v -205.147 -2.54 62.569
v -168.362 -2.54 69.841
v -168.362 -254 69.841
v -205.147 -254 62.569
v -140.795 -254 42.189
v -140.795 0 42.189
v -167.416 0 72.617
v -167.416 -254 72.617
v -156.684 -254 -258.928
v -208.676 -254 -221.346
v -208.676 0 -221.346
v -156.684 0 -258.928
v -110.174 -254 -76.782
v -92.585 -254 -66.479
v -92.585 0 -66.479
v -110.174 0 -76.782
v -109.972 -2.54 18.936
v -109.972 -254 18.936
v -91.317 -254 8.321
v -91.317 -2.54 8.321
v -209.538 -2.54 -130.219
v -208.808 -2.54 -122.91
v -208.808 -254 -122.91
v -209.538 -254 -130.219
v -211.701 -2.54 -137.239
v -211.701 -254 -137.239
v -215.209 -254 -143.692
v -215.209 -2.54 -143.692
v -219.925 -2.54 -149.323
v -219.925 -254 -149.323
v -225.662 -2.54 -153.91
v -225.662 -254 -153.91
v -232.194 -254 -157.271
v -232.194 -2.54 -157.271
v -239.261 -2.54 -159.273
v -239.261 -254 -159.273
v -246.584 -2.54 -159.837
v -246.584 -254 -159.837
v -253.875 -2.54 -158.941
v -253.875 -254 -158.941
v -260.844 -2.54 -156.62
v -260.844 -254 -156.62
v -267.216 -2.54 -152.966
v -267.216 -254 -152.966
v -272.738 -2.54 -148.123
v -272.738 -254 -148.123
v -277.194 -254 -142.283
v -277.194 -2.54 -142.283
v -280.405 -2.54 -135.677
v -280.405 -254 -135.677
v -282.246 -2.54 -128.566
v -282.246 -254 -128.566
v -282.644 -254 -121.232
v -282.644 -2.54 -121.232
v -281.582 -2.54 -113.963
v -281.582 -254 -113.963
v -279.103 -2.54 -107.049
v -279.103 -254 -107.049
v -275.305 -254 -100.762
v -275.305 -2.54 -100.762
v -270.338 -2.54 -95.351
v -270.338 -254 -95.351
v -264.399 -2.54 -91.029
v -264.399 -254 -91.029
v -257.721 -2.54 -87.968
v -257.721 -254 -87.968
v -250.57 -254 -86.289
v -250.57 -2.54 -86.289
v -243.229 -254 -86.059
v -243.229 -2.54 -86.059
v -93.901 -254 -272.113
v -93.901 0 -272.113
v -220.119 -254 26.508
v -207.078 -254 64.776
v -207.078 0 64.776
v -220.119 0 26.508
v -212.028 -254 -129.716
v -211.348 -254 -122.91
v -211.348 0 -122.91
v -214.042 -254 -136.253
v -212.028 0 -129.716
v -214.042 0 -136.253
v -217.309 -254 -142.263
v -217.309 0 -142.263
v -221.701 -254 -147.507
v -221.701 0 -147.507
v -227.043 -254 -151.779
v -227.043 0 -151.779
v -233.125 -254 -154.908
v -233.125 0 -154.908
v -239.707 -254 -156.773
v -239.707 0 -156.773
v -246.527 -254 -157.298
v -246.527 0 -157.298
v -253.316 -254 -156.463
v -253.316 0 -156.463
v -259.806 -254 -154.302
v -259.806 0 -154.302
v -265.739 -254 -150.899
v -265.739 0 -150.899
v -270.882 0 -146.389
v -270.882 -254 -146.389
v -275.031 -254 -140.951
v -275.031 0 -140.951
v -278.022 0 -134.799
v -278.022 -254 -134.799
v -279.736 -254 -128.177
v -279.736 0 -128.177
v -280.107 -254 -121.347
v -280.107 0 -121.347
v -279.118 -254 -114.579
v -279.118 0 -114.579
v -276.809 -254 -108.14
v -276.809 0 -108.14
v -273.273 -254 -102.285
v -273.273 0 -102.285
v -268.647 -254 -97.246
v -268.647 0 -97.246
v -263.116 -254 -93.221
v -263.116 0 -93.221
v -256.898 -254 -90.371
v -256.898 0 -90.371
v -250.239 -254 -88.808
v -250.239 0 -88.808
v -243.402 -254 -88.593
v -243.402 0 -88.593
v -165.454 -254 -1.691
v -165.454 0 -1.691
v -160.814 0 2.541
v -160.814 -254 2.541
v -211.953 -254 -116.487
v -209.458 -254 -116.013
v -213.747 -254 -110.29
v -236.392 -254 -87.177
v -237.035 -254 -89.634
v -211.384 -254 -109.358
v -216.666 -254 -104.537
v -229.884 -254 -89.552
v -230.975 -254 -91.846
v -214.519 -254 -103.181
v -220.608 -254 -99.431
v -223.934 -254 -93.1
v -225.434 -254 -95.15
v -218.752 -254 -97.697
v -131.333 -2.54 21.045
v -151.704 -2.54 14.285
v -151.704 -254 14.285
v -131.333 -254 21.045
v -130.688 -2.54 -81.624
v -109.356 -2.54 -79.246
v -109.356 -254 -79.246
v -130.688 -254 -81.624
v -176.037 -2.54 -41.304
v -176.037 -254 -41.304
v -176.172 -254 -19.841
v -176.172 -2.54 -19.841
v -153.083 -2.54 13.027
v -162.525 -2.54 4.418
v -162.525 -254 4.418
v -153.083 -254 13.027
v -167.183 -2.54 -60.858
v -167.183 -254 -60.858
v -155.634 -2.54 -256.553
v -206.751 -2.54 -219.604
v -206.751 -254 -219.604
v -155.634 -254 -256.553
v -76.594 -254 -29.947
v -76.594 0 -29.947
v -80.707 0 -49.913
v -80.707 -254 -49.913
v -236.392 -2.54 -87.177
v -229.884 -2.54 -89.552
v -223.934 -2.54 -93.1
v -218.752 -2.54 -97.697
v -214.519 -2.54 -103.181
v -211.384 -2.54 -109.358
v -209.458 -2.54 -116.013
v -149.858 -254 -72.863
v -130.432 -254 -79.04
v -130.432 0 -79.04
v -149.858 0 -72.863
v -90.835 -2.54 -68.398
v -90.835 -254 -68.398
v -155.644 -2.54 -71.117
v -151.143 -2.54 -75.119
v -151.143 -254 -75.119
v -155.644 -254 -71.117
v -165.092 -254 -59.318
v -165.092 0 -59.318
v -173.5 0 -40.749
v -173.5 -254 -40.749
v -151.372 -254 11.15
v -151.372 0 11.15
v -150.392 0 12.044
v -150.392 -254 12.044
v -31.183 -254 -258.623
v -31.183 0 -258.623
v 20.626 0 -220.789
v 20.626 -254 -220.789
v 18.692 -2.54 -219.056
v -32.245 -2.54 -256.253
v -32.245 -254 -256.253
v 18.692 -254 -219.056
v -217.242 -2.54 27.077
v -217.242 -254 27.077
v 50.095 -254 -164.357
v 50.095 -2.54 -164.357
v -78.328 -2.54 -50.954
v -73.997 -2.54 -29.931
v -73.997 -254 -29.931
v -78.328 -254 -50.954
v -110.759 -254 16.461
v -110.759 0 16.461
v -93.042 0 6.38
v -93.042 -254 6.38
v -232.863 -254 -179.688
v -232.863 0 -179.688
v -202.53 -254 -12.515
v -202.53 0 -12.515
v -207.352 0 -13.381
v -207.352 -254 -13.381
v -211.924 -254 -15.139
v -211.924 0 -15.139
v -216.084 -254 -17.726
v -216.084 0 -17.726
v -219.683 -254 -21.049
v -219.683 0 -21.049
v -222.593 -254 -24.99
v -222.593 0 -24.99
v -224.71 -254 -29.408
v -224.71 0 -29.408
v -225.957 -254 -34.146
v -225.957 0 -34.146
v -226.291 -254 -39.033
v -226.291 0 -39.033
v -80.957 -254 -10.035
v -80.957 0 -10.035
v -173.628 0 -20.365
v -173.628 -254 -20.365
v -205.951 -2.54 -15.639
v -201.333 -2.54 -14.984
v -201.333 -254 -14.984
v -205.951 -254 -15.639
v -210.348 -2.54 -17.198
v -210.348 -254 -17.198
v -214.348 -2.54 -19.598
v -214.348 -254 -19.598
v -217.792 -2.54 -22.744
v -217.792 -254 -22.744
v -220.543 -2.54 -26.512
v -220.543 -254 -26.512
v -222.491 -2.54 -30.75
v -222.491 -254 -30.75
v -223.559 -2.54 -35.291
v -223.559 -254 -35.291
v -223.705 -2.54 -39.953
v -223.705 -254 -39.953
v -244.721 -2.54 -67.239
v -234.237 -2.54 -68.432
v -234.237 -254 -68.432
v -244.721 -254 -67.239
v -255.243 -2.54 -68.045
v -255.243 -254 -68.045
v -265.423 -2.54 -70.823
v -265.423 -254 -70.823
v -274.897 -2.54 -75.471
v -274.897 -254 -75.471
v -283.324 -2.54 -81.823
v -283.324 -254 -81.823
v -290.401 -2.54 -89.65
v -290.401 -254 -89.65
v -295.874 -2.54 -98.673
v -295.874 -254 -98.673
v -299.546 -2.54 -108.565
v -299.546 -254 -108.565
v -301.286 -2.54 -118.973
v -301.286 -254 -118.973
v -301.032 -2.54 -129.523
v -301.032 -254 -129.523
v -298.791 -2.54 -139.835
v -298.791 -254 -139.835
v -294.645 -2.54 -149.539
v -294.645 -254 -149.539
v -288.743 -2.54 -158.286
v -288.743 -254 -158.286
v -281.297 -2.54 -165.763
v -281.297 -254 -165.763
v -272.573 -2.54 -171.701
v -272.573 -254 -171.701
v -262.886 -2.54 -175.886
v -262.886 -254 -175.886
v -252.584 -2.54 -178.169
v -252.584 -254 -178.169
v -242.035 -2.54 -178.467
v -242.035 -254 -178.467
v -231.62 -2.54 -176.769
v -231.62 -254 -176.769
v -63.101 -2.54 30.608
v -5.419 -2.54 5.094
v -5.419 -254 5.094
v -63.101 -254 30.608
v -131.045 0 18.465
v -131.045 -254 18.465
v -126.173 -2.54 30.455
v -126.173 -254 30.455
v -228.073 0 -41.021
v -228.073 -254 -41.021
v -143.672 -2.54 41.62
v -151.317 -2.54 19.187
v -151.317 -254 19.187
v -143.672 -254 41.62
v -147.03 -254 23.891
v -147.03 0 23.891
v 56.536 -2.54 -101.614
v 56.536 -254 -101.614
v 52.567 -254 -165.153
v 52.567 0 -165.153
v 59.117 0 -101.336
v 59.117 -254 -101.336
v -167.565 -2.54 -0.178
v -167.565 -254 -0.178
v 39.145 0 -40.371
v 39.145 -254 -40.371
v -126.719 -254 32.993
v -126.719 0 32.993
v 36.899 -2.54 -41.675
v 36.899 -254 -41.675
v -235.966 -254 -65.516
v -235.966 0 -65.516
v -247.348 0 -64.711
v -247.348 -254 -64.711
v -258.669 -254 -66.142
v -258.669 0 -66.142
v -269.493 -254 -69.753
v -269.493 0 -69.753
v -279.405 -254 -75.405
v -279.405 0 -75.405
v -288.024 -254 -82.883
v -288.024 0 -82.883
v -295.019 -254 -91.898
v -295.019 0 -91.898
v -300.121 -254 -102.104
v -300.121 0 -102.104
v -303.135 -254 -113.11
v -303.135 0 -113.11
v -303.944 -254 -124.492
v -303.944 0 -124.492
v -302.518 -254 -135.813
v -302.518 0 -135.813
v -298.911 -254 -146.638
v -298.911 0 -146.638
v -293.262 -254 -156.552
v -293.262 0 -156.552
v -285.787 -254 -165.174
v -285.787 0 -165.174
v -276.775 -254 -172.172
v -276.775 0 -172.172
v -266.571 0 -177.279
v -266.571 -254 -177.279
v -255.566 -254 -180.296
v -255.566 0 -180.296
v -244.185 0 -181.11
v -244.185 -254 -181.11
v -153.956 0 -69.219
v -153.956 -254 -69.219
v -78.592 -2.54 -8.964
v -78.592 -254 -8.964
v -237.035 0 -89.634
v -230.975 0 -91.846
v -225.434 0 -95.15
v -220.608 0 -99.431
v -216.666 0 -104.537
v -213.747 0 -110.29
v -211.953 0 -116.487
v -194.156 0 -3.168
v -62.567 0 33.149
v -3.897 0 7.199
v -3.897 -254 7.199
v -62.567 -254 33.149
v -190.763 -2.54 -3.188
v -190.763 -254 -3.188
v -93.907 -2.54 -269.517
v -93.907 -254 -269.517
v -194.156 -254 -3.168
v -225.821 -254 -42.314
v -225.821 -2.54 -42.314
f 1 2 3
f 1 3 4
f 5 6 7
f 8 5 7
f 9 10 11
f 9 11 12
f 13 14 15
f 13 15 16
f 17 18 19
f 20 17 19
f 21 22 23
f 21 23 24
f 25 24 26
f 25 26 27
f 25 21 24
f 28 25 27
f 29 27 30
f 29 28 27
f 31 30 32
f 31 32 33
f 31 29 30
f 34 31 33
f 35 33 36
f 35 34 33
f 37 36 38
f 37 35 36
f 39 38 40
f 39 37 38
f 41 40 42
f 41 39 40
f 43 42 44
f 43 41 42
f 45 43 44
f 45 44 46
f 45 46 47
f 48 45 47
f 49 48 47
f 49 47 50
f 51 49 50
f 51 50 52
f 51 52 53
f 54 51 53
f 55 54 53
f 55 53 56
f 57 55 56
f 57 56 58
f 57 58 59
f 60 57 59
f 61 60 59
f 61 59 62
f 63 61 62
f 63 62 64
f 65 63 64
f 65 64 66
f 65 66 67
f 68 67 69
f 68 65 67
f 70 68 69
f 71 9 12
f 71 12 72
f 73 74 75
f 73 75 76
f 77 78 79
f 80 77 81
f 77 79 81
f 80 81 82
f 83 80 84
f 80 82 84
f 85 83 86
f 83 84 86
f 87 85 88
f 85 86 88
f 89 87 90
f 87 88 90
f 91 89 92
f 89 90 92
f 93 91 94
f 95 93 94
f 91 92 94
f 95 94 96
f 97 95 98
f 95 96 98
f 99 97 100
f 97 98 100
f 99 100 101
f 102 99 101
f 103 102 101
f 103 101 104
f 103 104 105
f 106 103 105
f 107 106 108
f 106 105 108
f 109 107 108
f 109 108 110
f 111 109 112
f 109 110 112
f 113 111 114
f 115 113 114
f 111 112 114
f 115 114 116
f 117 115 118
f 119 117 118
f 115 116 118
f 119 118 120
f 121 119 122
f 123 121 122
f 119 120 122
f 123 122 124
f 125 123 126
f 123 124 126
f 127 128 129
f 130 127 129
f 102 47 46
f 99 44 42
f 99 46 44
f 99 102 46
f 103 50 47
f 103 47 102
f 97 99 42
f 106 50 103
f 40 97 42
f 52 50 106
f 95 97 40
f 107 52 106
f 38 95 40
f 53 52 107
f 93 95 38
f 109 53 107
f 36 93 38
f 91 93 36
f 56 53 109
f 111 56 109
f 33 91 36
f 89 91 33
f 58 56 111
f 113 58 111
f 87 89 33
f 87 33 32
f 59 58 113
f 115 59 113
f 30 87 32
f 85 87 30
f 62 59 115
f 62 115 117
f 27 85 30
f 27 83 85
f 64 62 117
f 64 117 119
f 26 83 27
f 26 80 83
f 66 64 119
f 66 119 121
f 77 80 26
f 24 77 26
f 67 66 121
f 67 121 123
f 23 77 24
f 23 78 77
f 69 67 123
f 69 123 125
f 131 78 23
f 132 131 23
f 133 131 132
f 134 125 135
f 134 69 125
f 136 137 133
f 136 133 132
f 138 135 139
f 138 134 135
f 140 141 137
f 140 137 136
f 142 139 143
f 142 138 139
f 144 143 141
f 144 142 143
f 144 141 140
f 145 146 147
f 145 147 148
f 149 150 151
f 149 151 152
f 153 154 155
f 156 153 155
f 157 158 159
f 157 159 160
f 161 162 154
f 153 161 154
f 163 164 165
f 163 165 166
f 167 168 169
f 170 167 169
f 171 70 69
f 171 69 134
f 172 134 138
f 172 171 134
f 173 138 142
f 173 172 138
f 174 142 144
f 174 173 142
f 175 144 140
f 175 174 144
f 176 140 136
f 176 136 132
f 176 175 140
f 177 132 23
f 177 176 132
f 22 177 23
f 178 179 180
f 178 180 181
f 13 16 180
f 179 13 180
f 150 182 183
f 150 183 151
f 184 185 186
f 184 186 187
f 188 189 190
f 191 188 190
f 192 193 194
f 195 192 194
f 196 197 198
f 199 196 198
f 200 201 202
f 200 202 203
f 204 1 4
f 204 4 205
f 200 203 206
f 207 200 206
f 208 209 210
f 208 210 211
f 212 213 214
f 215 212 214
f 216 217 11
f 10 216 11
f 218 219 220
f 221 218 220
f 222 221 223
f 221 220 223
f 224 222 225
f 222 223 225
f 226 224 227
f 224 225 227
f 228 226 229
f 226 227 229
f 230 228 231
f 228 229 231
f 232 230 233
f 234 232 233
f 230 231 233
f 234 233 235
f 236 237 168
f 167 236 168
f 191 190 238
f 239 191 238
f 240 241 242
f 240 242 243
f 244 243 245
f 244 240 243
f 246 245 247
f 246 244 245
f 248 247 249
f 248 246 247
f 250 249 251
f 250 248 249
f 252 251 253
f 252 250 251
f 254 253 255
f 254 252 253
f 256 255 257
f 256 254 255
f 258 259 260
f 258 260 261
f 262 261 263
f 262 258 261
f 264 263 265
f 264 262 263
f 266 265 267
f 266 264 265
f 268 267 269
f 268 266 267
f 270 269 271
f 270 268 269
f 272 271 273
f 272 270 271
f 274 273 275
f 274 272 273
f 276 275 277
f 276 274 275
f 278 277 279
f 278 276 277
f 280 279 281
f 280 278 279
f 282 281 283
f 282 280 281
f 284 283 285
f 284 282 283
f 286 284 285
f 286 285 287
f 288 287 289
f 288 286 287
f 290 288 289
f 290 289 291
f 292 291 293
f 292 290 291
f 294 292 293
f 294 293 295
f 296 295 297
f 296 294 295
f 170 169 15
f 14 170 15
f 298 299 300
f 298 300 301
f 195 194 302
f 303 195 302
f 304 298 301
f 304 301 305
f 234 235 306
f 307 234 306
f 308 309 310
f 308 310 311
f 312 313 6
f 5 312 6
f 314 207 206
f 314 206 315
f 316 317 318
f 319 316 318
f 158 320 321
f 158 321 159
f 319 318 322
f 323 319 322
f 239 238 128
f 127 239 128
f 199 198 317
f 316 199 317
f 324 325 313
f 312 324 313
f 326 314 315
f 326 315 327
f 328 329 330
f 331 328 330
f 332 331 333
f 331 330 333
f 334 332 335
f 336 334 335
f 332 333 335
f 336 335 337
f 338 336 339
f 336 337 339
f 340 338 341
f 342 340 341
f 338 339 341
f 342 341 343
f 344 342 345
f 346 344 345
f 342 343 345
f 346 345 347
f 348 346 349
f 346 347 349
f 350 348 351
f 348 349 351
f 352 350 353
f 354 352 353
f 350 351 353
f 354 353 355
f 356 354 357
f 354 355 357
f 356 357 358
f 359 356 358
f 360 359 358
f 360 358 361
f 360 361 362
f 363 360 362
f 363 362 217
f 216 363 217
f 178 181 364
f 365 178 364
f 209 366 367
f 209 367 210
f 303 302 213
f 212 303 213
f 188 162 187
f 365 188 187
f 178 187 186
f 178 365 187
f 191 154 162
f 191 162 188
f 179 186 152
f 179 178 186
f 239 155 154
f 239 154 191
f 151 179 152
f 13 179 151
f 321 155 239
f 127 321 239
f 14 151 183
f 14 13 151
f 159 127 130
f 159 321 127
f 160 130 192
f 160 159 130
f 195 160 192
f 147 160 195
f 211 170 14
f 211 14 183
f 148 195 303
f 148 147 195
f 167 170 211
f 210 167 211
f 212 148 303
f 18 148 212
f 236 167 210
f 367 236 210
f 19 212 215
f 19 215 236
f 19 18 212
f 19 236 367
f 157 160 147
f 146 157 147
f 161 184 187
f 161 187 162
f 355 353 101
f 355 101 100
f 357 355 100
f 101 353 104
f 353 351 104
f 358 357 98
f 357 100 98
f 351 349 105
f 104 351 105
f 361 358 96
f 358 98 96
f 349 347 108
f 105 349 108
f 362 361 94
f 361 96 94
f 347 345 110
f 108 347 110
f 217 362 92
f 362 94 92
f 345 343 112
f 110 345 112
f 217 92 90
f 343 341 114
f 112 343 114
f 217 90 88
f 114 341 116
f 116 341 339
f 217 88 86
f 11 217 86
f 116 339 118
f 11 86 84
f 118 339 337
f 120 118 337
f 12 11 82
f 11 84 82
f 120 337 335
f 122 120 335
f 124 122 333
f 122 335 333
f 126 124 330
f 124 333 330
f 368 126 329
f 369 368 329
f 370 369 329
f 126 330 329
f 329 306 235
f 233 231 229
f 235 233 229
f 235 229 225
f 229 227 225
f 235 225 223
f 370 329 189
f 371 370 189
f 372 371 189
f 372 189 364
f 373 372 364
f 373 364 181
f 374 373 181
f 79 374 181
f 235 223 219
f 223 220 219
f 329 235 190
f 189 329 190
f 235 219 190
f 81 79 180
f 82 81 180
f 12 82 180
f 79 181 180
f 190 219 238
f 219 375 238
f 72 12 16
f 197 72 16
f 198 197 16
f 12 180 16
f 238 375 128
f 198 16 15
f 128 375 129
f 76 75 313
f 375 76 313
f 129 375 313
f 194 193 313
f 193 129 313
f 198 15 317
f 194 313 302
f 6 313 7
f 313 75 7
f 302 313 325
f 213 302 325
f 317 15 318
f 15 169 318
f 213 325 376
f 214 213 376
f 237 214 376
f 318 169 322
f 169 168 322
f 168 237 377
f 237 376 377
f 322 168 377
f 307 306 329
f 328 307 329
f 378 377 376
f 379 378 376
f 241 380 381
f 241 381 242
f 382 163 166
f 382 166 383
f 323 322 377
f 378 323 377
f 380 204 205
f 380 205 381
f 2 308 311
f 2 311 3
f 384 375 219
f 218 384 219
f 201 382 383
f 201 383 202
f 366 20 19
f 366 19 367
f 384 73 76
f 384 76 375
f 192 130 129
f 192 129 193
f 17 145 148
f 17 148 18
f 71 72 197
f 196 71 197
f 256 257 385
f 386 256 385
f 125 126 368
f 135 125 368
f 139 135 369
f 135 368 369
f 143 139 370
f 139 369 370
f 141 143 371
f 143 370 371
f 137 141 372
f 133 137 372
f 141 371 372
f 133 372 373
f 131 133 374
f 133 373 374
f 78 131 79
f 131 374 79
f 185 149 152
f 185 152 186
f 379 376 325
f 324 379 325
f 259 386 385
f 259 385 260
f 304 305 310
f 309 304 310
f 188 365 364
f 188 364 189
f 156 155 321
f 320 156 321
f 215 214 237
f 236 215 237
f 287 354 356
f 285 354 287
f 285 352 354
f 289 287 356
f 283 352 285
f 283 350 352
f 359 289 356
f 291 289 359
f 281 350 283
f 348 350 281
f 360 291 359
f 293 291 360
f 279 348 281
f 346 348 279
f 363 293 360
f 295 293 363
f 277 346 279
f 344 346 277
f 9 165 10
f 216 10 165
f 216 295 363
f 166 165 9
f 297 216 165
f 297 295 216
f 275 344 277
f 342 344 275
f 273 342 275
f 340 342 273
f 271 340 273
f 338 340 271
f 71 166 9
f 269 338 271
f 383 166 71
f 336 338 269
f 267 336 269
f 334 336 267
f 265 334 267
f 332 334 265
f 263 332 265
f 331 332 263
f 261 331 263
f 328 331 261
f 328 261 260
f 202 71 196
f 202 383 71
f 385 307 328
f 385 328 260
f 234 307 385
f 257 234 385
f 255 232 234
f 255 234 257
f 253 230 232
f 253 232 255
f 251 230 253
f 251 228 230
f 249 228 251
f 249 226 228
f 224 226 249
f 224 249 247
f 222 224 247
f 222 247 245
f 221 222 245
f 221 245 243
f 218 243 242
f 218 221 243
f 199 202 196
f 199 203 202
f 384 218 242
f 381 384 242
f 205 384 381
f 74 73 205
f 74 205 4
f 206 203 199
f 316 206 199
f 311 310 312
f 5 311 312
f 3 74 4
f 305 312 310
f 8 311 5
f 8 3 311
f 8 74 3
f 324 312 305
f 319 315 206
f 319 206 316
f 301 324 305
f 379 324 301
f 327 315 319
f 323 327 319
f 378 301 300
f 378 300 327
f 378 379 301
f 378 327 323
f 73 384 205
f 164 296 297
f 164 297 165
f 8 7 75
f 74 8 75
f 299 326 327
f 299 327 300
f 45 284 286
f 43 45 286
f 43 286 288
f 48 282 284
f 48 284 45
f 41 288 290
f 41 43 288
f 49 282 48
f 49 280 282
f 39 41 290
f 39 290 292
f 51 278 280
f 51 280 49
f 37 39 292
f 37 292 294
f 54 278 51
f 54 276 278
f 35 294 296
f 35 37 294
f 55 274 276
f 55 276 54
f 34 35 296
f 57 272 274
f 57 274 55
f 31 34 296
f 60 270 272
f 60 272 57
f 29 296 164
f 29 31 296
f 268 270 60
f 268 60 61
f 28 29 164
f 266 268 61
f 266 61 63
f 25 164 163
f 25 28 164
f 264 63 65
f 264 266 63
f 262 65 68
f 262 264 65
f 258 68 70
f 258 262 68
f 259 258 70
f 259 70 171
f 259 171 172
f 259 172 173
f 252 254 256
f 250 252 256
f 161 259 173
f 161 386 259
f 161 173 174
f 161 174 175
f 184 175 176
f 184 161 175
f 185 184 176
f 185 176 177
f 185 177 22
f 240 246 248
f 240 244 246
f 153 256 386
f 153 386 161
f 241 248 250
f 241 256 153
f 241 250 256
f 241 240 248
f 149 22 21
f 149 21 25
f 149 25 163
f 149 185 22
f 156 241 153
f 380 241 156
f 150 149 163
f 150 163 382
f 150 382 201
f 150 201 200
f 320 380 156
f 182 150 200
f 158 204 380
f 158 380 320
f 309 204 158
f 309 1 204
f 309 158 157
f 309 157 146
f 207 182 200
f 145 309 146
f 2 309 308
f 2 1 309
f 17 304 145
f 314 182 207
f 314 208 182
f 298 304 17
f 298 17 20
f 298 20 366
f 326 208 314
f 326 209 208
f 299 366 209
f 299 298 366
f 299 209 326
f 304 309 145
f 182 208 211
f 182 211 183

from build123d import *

# Parameters (mm, degrees)
F1_DEPTH = 254
F2_T     = -2.54


with BuildPart() as f1:
    # F0 (on Front) → F1 (new body)
    with BuildSketch(Plane.XZ):
        with BuildLine():
            ThreePointArc((-243.4017726194, -88.5928585449), (-220.6078758628, -99.4306883092), (-211.3480547487, -122.9099556804))
            ThreePointArc((-211.3480547487, -122.9099556804), (-220.0765697788, -145.8071744938), (-241.8322543151, -157.0836896635))
            Line((-241.8322543151, -157.0836896635), (-240.887536248, -165.8666205301))
            Line((-240.887536248, -165.8666205301), (-232.8631227599, -179.6876024772))
            ThreePointArc((-232.8631227599, -179.6876024772), (-200.2497848188, -159.2393547198), (-187.5244002098, -122.9099556804))
            ThreePointArc((-187.5244002098, -122.9099556804), (-201.2534802405, -85.358063124), (-235.9657806801, -65.5164787306))
            Line((-235.9657806801, -65.5164787306), (-243.4017726194, -88.5928585449))
        make_face()
        with BuildLine():
            ThreePointArc((-241.8322543151, -157.0836896635), (-280.1330429902, -123.6979818064), (-243.4017726194, -88.5928585449))
            Line((-243.4017726194, -88.5928585449), (-235.9657806801, -65.5164787306))
            ThreePointArc((-235.9657806801, -65.5164787306), (-303.9442391321, -124.4915476748), (-232.8631227599, -179.6876024772))
            Line((-232.8631227599, -179.6876024772), (-240.887536248, -165.8666205301))
            Line((-240.887536248, -165.8666205301), (-241.8322543151, -157.0836896635))
        make_face()
        with BuildLine():
            Line((-228.0725515097, -41.0211382589), (-235.9657806801, -65.5164787306))
            ThreePointArc((-235.9657806801, -65.5164787306), (-201.2534802405, -85.358063124), (-187.5244002098, -122.9099556804))
            ThreePointArc((-187.5244002098, -122.9099556804), (-200.2497848188, -159.2393547198), (-232.8631227599, -179.6876024772))
            Line((-232.8631227599, -179.6876024772), (-208.6762458399, -221.3462719571))
            Line((-208.6762458399, -221.3462719571), (-156.6841606223, -258.9279433801))
            Line((-156.6841606223, -258.9279433801), (-93.9011844627, -272.1134223913))
            Line((-93.9011844627, -272.1134223913), (-31.1830643044, -258.6228198834))
            Line((-31.1830643044, -258.6228198834), (20.6256671009, -220.7887835882))
            Line((20.6256671009, -220.7887835882), (52.5668094258, -165.1531620926))
            Line((52.5668094258, -165.1531620926), (59.117448986, -101.335859787))
            Line((59.117448986, -101.335859787), (39.144920691, -40.3714680019))
            Line((39.144920691, -40.3714680019), (-3.8973438724, 7.1987160788))
            Line((-3.8973438724, 7.1987160788), (-62.5669461344, 33.1493754661))
            Line((-62.5669461344, 33.1493754661), (-126.7193788673, 32.9934053975))
            Line((-126.7193788673, 32.9934053975), (-147.0301676591, 23.8912264385))
            Line((-147.0301676591, 23.8912264385), (-151.3720759465, 11.1500154879))
            Line((-151.3720759465, 11.1500154879), (-150.3917100203, 12.0439557169))
            Line((-150.3917100203, 12.0439557169), (-131.0449616301, 18.4647337066))
            Line((-131.0449616301, 18.4647337066), (-110.7592618326, 16.461374779))
            Line((-110.7592618326, 16.461374779), (-93.0421924126, 6.3802778925))
            Line((-93.0421924126, 6.3802778925), (-80.9571956273, -10.0354437172))
            Line((-80.9571956273, -10.0354437172), (-76.5938772097, -29.9473626517))
            Line((-76.5938772097, -29.9473626517), (-80.7066945537, -49.9125272331))
            Line((-80.7066945537, -49.9125272331), (-92.5845041767, -66.4787791275))
            Line((-92.5845041767, -66.4787791275), (-110.1735248884, -76.7816628826))
            Line((-110.1735248884, -76.7816628826), (-130.4324552165, -79.0397162985))
            Line((-130.4324552165, -79.0397162985), (-149.8583420607, -72.8625014256))
            Line((-149.8583420607, -72.8625014256), (-153.9562515064, -69.2190774413))
            Line((-153.9562515064, -69.2190774413), (-165.0922731069, -59.3181148339))
            Line((-165.0922731069, -59.3181148339), (-173.5001632814, -40.7485040119))
            Line((-173.5001632814, -40.7485040119), (-173.6282119898, -20.3645233703))
            Line((-173.6282119898, -20.3645233703), (-165.4542784469, -1.6907483448))
            Line((-165.4542784469, -1.6907483448), (-160.8135918091, 2.5408312775))
            Line((-160.8135918091, 2.5408312775), (-193.497810345, -3.9201981196))
            Line((-193.497810345, -3.9201981196), (-194.1558035405, -3.1681041604))
            Line((-194.1558035405, -3.1681041604), (-202.5303474039, -12.5145749574))
            Line((-202.5303474039, -12.5145749574), (-226.2911018969, -39.0329384174))
            Line((-226.2911018969, -39.0329384174), (-228.0725515097, -41.0211382589))
        make_face()
        with BuildLine():
            ThreePointArc((-202.5303474039, -12.5145749574), (-219.6834854839, -21.0493031647), (-226.2911018969, -39.0329384174))
            Line((-226.2911018969, -39.0329384174), (-202.5303474039, -12.5145749574))
        make_face()
        Polygon((-185.2621036451, 6.7577745149), (-194.1558035405, -3.1681041604), (-193.497810345, -3.9201981196), (-160.8135918091, 2.5408312775), (-151.3720759465, 11.1500154879), (-147.0301676591, 23.8912264385), align=None)
        Polygon((-220.1187830788, 26.5078867238), (-194.1558035405, -3.1681041604), (-185.2621036451, 6.7577745149), (-147.0301676591, 23.8912264385), (-140.7948214191, 42.1886792022), (-167.4157941529, 72.6167640457), (-207.0777749827, 64.7763678065), align=None)
    extrude(amount=F1_DEPTH)

    # F2
    f2_openings = [f1.faces().sort_by_distance(p)[0] for p in [
        (-102.007505, -254, -118.633515),
    ]]
    offset(amount=F2_T, openings=f2_openings, kind=Kind.INTERSECTION)


solid = f1.part
